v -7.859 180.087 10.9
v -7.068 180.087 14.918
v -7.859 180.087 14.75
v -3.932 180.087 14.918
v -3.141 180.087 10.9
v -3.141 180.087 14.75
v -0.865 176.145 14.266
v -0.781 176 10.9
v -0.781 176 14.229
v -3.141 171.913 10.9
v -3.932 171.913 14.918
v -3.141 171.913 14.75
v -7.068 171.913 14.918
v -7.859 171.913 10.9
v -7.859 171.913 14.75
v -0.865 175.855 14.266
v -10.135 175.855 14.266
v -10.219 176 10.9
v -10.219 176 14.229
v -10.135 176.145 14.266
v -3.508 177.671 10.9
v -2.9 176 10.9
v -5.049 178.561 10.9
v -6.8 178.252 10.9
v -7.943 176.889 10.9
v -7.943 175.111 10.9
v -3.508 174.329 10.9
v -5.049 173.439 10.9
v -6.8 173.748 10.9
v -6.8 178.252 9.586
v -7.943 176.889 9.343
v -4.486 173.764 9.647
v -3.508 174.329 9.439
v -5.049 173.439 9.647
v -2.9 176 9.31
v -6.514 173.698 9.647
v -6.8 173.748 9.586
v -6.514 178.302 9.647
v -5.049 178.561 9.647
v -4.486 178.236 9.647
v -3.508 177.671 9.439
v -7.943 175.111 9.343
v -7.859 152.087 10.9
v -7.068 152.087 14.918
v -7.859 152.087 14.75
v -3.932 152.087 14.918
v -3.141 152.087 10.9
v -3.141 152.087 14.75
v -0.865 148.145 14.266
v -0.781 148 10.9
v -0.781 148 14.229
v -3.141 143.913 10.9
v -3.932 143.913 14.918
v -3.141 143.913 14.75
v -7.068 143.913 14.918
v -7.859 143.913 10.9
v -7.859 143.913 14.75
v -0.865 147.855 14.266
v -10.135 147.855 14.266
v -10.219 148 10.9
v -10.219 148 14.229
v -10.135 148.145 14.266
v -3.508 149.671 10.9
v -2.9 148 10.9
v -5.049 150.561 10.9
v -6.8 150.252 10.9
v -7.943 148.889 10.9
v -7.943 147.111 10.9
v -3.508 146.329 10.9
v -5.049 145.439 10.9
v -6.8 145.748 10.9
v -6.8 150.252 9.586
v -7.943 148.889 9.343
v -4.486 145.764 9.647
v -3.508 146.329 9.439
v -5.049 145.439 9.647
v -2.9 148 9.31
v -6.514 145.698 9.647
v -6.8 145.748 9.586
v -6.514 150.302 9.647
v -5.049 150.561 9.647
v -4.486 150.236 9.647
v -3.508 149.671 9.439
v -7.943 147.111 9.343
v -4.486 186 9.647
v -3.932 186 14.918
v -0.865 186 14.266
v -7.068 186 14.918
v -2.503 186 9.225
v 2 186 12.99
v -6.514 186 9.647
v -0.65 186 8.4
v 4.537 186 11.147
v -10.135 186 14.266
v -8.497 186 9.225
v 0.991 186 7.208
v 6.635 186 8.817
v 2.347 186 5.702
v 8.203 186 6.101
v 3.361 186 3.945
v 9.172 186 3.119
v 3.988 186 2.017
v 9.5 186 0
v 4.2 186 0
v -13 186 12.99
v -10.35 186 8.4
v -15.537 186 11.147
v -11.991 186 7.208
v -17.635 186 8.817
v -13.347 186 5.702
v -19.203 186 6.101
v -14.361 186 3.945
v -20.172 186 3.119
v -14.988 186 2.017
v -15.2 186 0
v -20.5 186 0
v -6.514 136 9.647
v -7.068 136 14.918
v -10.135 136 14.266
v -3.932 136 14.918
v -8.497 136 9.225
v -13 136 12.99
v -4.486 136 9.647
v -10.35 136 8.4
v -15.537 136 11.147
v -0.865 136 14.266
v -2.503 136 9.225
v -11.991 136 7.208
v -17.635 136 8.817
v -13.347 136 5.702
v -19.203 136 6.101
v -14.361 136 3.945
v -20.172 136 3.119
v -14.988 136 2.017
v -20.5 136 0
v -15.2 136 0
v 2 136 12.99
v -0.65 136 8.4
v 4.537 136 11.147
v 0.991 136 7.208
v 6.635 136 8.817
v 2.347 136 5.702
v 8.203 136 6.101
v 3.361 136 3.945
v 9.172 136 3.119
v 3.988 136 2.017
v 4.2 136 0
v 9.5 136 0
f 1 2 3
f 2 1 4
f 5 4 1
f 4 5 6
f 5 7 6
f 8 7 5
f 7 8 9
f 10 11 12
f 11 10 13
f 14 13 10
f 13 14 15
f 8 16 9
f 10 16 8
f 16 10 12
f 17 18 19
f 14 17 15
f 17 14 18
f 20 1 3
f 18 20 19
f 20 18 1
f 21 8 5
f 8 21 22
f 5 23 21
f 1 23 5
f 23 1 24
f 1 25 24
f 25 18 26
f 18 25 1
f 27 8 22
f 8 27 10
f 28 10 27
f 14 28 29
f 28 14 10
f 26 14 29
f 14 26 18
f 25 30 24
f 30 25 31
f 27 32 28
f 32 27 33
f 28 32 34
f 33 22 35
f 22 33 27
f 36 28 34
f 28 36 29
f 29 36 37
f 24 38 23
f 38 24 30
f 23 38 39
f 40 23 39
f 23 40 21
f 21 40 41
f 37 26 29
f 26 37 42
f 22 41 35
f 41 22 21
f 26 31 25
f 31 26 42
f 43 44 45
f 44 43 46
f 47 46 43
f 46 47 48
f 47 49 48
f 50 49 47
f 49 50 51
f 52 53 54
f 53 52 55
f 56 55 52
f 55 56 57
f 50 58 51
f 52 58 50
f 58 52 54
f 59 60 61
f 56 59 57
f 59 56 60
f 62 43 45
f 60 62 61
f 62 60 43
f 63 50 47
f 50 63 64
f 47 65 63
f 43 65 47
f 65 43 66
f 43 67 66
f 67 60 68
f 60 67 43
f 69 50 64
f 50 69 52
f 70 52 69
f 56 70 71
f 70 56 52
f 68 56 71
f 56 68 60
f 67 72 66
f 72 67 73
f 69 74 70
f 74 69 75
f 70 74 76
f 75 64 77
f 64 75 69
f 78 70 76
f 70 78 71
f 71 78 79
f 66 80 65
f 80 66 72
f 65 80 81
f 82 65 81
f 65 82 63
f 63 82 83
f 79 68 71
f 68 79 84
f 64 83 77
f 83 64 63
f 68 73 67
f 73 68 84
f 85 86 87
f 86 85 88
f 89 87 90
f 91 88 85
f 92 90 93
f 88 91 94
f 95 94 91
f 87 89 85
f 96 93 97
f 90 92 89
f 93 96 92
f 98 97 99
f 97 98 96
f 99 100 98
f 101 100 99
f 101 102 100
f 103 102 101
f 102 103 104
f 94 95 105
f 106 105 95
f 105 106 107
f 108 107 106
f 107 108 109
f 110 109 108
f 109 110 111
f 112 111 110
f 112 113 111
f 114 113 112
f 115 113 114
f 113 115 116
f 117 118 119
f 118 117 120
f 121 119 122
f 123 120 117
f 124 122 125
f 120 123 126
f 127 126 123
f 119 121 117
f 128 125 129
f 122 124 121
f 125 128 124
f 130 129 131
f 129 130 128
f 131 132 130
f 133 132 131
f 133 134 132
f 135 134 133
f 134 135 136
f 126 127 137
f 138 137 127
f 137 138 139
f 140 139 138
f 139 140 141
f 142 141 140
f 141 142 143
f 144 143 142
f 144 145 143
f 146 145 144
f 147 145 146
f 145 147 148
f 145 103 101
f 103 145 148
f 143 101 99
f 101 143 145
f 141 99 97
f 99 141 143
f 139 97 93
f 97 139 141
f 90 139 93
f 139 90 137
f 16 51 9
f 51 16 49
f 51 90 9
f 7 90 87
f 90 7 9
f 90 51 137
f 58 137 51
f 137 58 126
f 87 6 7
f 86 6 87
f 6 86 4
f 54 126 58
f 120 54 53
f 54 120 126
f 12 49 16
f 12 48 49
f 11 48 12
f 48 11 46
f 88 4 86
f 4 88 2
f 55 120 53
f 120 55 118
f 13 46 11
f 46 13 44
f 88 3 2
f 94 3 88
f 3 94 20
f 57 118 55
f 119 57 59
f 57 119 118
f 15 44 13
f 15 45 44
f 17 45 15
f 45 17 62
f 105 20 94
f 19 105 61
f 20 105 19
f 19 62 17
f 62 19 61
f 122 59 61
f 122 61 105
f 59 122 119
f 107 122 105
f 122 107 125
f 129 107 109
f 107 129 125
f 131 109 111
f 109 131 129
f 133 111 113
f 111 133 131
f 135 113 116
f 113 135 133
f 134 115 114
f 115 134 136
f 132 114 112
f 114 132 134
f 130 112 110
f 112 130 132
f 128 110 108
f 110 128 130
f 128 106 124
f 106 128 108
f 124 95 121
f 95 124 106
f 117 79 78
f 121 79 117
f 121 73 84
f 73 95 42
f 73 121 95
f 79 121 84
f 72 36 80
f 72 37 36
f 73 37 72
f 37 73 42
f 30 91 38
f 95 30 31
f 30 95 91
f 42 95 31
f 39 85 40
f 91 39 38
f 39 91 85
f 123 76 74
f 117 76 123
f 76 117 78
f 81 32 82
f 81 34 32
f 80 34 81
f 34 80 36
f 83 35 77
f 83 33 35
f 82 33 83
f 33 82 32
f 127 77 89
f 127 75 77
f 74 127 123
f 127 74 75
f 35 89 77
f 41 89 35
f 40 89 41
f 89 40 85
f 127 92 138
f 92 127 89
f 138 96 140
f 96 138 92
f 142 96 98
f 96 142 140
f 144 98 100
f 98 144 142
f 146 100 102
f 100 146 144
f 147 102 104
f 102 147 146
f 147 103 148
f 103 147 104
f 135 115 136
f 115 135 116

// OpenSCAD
poleInnerDiameter = 17;//17.2;
poleOuterDiameter = 19.4; //19.2;

attachmentWallThickness = 5.25;
height = 50;

outerDiameter = 30;

echo("Screw length:", outerDiameter);

frontAdditions();
//backAdditions();

module frontAdditions(rotation=0) {
    translate([-5.5, 136 + height])
    intersection() {
        rotate([90, 0, 0])
            rotate(rotation) attachment();

        cylinder(d=1000, h=1000, $fn=4);
    }
}

module frontCutouts() {
    extra = 75;
    translate([-5.5, 136 + height/2])
        rotate([90, 0, 0])
        cylinder(d=poleInnerDiameter-2, h=height + extra);
}

module backAdditions() {
    frontAdditions(180);
}

module backCutouts() {
    frontCutouts();
}

module attachment() {
    difference() {
        linear_extrude(height, convexity=2) difference() {
            // Outer wall
            circle(d=outerDiameter);

            // Wire hole
            circle(d=poleOuterDiameter);
        }


        // Screw and nut
        for(z=[10, height - 12])
            translate([0, outerDiameter/2, z])
            rotate([90, 0])
            m5ScrewAndNut(length=outerDiameter);
    }
}

module m6ScrewAndNut(length=20, tolerance=.1) {
    // https://www.mcmaster.com/90236a161/
    screwDiameter = 6 ;
    headDiameter = 11.3;
    headHeight = 3.3;

    // Nut from https://www.mcmaster.com/91415A210/
    nutHeight = 5;
    nutFlatWidth = 10;
    nutDiameter = nutFlatWidth / cos(30); // Convert flat-to-flat to circumscribed diameter

    cylinder(d=nutDiameter + tolerance*2, h=nutHeight+tolerance, $fn=6);
    cylinder(d=screwDiameter + tolerance*2, h=length);
    translate([0, 0, length - headHeight - tolerance])
        cylinder(d1=screwDiameter + tolerance*2, d2=headDiameter + tolerance*2, h=headHeight+tolerance*2);
}

module m5ScrewAndNut(length=20, tolerance=.1) {
    // https://www.mcmaster.com/92125A216/
    screwDiameter = 5 ;
    headDiameter = 10;
    headHeight = 2.8;

    // Nut from https://www.mcmaster.com/91828A241/
    nutHeight = 4;
    nutFlatWidth = 8;
    nutDiameter = nutFlatWidth / cos(30); // Convert flat-to-flat to circumscribed diameter

    cylinder(d=nutDiameter + tolerance*2, h=nutHeight+tolerance, $fn=6);
    cylinder(d=screwDiameter + tolerance*2, h=length);
    translate([0, 0, length - headHeight - tolerance])
        cylinder(d1=screwDiameter + tolerance*2, d2=headDiameter + tolerance*2, h=headHeight+tolerance*2);
}
